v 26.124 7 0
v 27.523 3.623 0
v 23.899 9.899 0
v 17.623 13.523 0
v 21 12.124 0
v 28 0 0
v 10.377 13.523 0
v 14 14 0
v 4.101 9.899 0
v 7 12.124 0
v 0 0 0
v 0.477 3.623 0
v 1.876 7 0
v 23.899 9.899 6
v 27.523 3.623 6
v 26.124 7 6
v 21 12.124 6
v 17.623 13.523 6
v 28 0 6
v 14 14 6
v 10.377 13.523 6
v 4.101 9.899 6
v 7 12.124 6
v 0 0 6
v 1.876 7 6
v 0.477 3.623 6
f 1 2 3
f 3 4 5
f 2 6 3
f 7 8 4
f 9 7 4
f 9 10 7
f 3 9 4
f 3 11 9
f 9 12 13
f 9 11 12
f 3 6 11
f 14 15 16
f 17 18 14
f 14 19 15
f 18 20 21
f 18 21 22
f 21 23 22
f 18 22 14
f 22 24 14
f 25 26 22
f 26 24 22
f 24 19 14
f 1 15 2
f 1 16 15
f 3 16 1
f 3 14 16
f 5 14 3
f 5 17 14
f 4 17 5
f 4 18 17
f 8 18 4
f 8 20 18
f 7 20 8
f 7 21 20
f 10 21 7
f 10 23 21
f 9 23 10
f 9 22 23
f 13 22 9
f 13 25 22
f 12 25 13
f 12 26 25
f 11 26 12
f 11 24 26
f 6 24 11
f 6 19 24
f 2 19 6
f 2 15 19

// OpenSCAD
$fn = 32;

// ----------------------------------------------------------------------
// Key bar: woodruff key, 6 mm thick
// ----------------------------------------------------------------------

// --- parameters (mm) ---
profile_height = 6;       // extrusion height
profile_points = 13;      // points of the closed outline

profile = [[28, 0], [27.523, 3.623], [26.124, 7], [23.899, 9.899], [21, 12.124], [17.623, 13.523], [14, 14], [10.377, 13.523], [7, 12.124], [4.101, 9.899], [1.876, 7], [0.477, 3.623], [0, 0]];  // single closed polygon, 13 points, counter clockwise

// --- the one profile operation ---
linear_extrude(height = profile_height) polygon(points = profile);
